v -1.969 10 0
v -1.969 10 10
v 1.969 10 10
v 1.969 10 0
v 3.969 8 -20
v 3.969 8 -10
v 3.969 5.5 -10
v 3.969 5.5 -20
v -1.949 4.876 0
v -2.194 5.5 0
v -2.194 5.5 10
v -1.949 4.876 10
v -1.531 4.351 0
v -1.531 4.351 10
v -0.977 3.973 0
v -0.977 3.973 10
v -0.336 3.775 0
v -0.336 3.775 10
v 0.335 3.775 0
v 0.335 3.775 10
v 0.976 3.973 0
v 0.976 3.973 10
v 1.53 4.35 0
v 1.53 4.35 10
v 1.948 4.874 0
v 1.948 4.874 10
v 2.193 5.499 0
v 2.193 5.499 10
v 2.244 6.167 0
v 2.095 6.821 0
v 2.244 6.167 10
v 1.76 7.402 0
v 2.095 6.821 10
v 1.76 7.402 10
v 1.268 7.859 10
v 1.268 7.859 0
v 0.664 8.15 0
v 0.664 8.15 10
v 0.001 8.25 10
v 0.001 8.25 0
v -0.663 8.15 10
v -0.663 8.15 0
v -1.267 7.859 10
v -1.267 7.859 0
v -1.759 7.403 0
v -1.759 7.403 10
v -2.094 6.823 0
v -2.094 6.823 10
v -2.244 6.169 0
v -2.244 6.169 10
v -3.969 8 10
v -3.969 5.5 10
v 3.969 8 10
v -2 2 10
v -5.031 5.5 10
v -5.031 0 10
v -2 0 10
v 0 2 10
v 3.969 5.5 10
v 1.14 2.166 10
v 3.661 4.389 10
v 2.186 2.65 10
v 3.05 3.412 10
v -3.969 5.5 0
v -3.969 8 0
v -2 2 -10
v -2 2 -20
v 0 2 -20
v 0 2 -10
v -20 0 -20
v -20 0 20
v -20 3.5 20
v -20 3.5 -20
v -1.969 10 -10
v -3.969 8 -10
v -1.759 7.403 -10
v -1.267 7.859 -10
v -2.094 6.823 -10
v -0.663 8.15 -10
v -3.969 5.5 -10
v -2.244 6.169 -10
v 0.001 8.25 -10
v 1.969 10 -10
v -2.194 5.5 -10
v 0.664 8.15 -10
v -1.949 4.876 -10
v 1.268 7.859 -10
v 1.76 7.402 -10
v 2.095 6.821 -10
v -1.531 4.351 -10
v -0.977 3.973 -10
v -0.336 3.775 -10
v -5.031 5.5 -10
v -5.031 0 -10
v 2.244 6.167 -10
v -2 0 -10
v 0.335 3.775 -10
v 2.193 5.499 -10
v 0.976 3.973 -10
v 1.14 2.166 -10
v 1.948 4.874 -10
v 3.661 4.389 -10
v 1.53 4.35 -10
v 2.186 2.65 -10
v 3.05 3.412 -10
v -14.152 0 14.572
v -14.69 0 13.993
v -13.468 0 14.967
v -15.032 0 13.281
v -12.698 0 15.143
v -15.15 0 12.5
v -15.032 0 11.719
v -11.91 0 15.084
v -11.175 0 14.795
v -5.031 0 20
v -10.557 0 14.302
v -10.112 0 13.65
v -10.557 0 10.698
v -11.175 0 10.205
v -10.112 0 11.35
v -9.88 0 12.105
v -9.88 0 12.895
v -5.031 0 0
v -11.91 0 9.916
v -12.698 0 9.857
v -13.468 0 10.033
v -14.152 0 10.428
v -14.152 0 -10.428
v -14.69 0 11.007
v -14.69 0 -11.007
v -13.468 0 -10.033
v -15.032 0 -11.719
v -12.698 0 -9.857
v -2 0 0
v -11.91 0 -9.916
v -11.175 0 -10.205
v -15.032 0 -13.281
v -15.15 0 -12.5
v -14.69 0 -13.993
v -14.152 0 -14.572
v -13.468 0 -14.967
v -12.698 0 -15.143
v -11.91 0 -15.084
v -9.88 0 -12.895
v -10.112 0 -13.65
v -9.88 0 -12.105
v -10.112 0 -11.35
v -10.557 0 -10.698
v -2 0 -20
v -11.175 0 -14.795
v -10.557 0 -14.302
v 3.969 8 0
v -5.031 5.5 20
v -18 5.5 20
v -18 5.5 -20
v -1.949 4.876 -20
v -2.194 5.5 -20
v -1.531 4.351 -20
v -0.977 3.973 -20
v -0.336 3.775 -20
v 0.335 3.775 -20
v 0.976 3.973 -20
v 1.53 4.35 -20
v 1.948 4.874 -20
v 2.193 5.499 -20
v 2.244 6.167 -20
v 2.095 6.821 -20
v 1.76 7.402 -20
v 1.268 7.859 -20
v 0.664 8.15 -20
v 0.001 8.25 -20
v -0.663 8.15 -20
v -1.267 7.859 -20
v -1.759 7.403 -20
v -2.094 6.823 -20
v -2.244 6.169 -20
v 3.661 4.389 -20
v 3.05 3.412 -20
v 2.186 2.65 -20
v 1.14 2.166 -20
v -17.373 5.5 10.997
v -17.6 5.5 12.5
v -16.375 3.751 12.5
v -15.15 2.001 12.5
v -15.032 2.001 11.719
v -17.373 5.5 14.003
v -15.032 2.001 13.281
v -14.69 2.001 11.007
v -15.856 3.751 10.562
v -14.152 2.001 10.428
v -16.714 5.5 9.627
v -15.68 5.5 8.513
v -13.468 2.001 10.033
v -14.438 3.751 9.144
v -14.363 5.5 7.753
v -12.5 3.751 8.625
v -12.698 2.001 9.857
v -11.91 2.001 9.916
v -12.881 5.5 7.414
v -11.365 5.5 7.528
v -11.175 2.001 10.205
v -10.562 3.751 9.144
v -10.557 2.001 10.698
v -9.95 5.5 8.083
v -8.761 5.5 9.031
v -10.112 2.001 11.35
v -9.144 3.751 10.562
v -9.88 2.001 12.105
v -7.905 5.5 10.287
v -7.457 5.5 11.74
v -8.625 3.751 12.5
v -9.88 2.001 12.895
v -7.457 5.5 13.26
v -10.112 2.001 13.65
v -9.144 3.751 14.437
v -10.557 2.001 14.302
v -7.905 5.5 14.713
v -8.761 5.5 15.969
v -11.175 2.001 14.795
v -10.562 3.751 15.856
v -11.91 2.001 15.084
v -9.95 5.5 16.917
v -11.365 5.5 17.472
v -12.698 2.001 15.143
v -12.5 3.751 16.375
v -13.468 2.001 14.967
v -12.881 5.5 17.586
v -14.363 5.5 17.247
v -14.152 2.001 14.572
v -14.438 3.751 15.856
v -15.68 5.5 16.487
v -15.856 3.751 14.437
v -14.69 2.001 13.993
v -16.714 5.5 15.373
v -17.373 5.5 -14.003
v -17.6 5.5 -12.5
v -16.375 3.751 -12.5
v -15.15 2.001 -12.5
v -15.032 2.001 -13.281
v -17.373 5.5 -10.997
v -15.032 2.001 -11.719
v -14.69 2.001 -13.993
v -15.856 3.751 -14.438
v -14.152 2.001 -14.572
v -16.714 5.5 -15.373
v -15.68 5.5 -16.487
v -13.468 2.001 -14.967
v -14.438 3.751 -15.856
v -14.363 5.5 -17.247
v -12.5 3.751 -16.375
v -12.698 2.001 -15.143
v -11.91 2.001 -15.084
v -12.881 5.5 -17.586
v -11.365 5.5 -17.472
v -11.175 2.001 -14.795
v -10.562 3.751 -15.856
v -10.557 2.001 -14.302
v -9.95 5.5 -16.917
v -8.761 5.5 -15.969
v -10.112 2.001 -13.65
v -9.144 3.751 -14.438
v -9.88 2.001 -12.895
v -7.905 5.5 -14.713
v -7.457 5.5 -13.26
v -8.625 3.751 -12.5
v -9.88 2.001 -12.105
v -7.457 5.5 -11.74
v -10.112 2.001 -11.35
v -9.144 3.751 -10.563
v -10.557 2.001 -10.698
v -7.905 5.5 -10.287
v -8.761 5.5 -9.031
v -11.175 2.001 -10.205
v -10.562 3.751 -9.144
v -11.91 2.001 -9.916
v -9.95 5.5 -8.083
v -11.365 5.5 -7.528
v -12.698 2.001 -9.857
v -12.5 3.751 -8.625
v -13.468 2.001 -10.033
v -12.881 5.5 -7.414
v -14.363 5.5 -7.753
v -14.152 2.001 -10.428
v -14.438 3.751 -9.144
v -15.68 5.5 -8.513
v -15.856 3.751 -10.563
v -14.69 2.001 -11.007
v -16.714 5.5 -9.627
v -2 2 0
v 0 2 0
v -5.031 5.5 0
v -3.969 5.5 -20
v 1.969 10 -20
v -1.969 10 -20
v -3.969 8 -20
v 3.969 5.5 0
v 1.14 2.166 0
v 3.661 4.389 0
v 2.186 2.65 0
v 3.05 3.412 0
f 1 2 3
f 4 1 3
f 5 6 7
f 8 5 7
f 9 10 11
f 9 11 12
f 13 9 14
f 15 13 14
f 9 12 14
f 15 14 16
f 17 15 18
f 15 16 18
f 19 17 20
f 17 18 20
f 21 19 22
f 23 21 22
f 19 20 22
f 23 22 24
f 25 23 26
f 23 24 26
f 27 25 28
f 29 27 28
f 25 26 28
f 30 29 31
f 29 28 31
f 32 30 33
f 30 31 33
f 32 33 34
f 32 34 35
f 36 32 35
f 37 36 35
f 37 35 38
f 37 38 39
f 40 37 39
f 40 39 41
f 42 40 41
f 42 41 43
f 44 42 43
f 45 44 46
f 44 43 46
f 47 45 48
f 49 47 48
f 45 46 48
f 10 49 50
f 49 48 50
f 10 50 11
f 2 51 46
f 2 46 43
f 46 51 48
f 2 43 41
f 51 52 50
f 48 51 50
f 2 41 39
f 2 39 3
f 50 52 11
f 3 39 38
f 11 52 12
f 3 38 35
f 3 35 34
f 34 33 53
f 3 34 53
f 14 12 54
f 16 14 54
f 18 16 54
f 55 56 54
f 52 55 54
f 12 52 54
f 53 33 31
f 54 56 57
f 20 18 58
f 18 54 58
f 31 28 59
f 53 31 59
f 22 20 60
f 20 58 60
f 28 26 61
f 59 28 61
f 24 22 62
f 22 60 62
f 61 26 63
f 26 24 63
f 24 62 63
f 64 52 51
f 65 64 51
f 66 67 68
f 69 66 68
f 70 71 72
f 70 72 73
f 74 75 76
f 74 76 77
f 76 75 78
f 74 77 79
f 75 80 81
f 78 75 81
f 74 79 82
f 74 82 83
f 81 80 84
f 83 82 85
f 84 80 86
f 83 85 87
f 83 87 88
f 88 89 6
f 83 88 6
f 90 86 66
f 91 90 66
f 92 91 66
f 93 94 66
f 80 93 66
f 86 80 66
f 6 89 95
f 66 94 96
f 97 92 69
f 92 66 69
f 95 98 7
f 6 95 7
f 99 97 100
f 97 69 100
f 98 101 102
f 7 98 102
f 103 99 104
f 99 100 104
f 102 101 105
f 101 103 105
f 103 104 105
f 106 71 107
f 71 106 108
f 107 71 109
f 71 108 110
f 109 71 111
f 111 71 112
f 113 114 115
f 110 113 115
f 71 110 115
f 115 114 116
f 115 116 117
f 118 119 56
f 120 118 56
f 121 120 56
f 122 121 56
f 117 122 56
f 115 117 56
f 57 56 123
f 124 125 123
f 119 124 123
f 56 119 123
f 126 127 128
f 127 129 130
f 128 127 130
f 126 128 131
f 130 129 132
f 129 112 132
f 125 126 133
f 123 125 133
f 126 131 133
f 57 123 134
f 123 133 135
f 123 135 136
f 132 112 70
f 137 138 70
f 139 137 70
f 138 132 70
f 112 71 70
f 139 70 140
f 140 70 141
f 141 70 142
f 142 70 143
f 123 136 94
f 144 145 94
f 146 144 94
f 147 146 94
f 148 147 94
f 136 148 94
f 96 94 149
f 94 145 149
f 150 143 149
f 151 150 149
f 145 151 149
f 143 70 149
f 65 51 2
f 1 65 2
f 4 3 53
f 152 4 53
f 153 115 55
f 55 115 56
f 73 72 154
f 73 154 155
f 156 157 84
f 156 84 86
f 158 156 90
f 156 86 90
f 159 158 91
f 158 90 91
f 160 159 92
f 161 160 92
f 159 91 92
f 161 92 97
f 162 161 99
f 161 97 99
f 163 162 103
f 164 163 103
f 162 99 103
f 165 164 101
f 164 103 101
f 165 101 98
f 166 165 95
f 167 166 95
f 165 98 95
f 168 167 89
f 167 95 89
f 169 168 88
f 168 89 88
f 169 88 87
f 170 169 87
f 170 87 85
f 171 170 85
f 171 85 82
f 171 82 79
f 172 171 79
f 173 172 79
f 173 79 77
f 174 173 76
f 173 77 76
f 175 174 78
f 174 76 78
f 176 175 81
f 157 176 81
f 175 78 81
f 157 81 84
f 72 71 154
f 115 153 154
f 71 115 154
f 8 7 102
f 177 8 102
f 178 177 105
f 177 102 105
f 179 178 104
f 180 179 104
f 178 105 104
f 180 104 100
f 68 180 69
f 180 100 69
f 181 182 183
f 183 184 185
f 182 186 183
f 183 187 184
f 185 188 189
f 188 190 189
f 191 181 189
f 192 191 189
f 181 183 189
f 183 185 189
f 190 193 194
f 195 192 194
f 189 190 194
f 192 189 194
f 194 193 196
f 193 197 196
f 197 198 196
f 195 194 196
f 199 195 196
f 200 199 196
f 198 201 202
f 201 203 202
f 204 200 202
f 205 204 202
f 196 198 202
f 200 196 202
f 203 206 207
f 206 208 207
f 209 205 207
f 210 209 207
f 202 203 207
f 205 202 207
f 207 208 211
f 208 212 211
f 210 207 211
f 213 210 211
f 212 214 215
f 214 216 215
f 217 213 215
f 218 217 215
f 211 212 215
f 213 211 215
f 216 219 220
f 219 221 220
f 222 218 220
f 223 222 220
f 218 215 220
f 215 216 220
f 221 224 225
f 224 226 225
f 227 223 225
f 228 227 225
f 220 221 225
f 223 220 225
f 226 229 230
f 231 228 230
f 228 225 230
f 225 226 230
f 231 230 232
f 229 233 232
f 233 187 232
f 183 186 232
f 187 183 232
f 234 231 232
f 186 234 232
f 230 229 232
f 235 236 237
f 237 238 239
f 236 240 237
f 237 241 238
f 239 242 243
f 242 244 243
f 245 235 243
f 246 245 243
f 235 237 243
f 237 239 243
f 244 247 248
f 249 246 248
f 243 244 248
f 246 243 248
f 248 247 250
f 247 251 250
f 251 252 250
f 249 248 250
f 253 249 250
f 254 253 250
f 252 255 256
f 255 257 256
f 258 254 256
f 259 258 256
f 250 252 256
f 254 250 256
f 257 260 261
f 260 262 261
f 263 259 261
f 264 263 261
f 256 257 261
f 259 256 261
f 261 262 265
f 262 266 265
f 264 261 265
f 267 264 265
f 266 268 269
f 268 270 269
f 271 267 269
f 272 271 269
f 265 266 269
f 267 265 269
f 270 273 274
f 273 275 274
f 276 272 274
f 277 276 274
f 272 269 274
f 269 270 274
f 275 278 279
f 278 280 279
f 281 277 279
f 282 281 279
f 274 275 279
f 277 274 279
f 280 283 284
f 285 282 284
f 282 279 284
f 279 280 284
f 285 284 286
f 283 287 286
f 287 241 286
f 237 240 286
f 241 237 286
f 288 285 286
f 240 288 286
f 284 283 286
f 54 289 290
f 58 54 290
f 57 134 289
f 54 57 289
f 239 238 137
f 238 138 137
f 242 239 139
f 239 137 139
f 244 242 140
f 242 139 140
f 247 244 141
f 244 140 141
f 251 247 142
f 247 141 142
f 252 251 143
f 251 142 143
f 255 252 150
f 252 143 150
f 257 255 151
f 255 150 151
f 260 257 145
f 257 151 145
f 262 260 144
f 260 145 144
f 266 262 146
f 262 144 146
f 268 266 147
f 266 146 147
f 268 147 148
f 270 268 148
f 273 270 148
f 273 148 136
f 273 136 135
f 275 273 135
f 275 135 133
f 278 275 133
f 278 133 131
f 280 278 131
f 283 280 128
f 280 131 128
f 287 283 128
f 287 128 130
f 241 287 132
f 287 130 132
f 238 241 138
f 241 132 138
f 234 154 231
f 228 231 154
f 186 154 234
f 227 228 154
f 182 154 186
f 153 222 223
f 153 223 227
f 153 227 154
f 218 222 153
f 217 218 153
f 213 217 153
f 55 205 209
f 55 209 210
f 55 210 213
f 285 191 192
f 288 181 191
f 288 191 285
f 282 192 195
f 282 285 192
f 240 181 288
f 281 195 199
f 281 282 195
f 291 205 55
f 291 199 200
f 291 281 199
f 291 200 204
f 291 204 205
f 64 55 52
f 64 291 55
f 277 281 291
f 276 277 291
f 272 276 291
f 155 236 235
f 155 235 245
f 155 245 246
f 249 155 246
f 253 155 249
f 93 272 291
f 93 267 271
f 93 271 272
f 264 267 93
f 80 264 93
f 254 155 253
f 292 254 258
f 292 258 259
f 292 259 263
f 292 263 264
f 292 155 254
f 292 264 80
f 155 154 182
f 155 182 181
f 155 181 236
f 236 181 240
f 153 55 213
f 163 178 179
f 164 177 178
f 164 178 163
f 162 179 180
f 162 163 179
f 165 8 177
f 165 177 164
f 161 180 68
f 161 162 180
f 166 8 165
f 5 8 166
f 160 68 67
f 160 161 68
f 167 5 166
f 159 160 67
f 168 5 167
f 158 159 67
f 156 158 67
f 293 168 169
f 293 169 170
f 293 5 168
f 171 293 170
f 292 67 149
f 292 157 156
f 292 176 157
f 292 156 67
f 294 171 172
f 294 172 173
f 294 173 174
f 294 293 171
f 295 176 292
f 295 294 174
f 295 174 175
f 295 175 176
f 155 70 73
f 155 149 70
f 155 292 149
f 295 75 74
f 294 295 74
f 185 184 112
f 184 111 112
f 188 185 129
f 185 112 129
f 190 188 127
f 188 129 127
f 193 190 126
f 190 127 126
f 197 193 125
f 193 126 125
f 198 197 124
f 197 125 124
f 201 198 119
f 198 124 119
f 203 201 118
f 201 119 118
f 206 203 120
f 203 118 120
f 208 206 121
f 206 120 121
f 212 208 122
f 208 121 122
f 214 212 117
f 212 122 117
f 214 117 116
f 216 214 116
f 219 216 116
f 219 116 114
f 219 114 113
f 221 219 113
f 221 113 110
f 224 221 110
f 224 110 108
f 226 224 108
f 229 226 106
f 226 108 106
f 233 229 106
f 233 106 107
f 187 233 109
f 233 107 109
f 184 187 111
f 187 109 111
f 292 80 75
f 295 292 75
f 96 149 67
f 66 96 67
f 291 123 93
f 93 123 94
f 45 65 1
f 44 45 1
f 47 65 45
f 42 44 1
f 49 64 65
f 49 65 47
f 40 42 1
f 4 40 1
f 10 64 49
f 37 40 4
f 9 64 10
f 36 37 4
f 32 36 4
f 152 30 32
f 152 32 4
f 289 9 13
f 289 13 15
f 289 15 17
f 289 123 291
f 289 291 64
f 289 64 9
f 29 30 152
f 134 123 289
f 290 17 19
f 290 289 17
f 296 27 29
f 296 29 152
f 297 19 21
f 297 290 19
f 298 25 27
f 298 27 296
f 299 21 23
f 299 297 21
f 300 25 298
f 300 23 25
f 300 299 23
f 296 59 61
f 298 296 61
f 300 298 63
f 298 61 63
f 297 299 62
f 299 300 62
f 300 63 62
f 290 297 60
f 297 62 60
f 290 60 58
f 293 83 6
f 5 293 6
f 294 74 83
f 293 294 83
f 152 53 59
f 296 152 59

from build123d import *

# Parameters (mm, degrees)
SKETCH_1_W                   = 20
SKETCH_1_H                   = 40
EXTRUDE_1_DEPTH              = 5.5
SKETCH_2_W                   = 2
SKETCH_2_H                   = 2
CUT_EXTRUDE_1_DEPTH          = 46.058295574
SKETCH_3_R                   = 2.25
EXTRUDE_2_DEPTH              = 40
SKETCH_3_2_R                 = 2.25
CUT_EXTRUDE_2_DEPTH          = 46.82575695
CHAMFER_1_SIZE               = 2
SKETCH_4_W                   = 9
SKETCH_4_H                   = 10
CUT_EXTRUDE_3_DEPTH          = 31
HOLE_WIZARD_M5_3_D           = 5.3
HOLE_WIZARD_M5_3_DEPTH       = 6
HOLE_WIZARD_M5_3_CSINK_D     = 10.2
HOLE_WIZARD_M5_3_CSINK_ANGLE = 70
HOLE_WIZARD_M5_3_TIP         = 1.59228064


with BuildPart() as part:
    # 草图1 → 凸台-拉伸1 (new body)
    with BuildSketch(Plane(origin=(0, 0, 0), x_dir=(1, 0, 0), z_dir=(0, 1, 0))):
        with Locations((-10, 0)):
            Rectangle(SKETCH_1_W, SKETCH_1_H)
    extrude(amount=EXTRUDE_1_DEPTH)

    # 草图2 → 切除-拉伸1 (cut, through all)
    with BuildSketch(Plane.XY.offset(20)):
        with Locations((-1, 1)):
            Rectangle(SKETCH_2_W, SKETCH_2_H)
    extrude(amount=-CUT_EXTRUDE_1_DEPTH, mode=Mode.SUBTRACT)

    # 草图3 → 凸台-拉伸2 (add)
    with BuildSketch(Plane.XY.offset(20)):
        with BuildLine():
            Line((-1.968626967, 10), (1.968626967, 10))
            Line((1.968626967, 10), (3.968626967, 8))
            Line((3.968626967, 8), (3.968626967, 5.5))
            ThreePointArc((3.968626967, 5.5), (0, 2), (-3.968626967, 5.5))
            Line((-3.968626967, 5.5), (-3.968626967, 8))
            Line((-3.968626967, 8), (-1.968626967, 10))
        make_face()
        with Locations((0, 6)):
            Circle(SKETCH_3_R, mode=Mode.SUBTRACT)
    extrude(amount=-EXTRUDE_2_DEPTH)

    # 草图3<2> → 切除-拉伸2 (cut, through all)
    with BuildSketch(Plane.XY.offset(20)):
        with Locations((0, 6)):
            Circle(SKETCH_3_2_R)
    extrude(amount=-CUT_EXTRUDE_2_DEPTH, mode=Mode.SUBTRACT)

    # 倒角1
    chamfer_1_edges = [part.edges().sort_by_distance(p)[0] for p in [
        (-20, 5.5, 0),
    ]]
    chamfer(chamfer_1_edges, length=CHAMFER_1_SIZE)

    # 草图4 → 切除-拉伸3 (cut, through all)
    with BuildSketch(Plane(origin=(0, 0, 0), x_dir=(1, 0, 0), z_dir=(0, 1, 0))):
        with Locations((-0.531373033, 5)):
            Rectangle(SKETCH_4_W, SKETCH_4_H)
        with Locations((-0.531373033, -15)):
            Rectangle(SKETCH_4_W, SKETCH_4_H)
    extrude(amount=CUT_EXTRUDE_3_DEPTH, mode=Mode.SUBTRACT)

    # M5 十字切槽平头螺钉锥孔槽口3
    with Locations(Plane(origin=(0, 5.5, 0), x_dir=(1, 0, 0), z_dir=(0, 1, 0))):
        with Locations((-12.5, 12.5), (-12.5, -12.5)):
            CounterSinkHole(HOLE_WIZARD_M5_3_D / 2, HOLE_WIZARD_M5_3_CSINK_D / 2, depth=HOLE_WIZARD_M5_3_DEPTH, counter_sink_angle=HOLE_WIZARD_M5_3_CSINK_ANGLE)
            with Locations((0, 0, -(HOLE_WIZARD_M5_3_DEPTH + HOLE_WIZARD_M5_3_TIP / 2))):  # 118° drill point
                Cone(0, HOLE_WIZARD_M5_3_D / 2, HOLE_WIZARD_M5_3_TIP, mode=Mode.SUBTRACT)


solid = part.part
